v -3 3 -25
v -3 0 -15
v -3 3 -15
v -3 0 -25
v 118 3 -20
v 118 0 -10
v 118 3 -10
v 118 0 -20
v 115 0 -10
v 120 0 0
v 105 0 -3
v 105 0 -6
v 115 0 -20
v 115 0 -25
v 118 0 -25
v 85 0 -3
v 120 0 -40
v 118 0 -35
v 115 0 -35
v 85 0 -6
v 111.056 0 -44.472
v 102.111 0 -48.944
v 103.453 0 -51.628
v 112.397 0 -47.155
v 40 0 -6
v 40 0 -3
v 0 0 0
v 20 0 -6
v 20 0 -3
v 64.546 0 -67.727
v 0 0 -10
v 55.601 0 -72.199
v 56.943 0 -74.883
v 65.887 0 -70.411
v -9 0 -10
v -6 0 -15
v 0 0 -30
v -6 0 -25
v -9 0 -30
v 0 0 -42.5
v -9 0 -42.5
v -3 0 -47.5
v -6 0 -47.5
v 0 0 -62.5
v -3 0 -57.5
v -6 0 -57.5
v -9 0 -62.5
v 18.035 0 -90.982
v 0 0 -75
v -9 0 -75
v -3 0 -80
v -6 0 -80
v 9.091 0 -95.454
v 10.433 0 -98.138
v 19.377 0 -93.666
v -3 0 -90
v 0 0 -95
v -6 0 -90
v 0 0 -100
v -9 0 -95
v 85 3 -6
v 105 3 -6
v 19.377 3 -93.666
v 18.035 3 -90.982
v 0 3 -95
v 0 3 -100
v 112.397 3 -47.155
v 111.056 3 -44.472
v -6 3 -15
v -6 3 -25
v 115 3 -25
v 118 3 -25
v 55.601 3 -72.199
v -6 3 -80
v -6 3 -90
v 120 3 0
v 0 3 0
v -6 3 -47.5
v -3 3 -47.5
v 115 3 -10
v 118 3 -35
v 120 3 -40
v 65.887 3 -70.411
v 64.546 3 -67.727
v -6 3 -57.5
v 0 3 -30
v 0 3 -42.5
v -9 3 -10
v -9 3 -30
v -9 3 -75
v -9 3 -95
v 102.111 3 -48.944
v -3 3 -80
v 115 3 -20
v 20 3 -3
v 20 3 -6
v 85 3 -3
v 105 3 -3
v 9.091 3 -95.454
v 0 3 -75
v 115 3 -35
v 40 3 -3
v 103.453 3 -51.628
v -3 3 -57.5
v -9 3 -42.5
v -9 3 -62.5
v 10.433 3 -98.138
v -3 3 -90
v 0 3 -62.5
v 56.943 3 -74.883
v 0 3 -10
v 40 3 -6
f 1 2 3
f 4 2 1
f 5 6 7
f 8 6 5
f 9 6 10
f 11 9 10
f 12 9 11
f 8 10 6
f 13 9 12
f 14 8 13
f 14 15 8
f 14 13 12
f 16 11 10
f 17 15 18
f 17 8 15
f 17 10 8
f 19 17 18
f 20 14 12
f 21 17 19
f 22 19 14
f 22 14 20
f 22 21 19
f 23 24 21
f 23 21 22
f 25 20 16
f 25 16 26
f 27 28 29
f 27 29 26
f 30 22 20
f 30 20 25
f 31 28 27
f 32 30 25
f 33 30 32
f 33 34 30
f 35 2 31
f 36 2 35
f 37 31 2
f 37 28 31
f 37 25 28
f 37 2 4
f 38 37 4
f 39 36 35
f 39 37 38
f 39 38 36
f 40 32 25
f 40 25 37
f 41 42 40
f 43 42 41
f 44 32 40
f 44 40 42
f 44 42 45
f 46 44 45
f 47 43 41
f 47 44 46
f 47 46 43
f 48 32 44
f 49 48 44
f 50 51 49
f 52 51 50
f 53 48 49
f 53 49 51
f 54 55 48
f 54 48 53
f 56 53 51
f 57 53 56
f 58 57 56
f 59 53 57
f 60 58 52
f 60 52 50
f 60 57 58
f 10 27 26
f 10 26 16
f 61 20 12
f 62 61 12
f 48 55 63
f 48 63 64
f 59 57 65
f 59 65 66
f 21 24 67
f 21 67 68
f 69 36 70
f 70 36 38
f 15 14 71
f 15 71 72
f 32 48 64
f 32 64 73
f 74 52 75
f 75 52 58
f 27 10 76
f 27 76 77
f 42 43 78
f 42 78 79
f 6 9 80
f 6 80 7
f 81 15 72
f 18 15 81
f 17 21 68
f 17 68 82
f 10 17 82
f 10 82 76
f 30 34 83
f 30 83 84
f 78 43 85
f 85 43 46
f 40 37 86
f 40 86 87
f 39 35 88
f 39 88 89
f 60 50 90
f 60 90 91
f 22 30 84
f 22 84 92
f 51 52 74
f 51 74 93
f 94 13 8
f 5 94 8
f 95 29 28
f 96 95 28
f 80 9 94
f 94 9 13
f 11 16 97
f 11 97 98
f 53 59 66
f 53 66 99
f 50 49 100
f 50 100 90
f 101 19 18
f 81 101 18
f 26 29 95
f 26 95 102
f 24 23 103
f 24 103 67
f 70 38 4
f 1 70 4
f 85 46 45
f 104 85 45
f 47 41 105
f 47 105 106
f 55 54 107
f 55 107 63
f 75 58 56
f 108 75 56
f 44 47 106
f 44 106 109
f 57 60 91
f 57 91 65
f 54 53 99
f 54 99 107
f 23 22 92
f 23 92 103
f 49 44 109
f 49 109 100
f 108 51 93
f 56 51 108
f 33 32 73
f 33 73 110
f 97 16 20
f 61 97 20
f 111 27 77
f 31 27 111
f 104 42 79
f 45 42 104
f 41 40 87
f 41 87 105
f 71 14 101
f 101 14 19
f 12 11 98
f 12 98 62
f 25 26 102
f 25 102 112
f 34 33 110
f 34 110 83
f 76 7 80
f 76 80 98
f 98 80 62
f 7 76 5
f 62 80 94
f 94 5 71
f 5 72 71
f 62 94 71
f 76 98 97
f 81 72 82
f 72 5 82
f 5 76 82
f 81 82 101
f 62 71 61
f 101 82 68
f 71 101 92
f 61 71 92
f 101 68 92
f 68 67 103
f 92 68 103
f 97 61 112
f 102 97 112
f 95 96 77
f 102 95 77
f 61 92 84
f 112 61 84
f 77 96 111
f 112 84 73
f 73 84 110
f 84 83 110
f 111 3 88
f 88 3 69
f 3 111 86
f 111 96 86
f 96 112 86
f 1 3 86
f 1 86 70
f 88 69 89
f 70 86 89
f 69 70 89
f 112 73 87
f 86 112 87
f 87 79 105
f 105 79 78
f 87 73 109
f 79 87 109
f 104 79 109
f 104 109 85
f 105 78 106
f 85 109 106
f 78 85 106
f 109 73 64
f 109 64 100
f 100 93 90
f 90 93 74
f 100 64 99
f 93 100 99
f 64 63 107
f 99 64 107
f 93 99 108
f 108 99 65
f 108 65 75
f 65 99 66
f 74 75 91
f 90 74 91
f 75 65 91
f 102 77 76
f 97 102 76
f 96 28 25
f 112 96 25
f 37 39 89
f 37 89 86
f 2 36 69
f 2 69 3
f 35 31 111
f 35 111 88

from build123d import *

# Parameters (mm, degrees)
SKETCH1_W           = 3
SKETCH1_H           = 10
SKETCH1_W_2         = 20
SKETCH1_H_2         = 3
BOSS_EXTRUDE1_DEPTH = 3


with BuildPart() as part:
    # Sketch1 → Boss-Extrude1 (new body)
    with BuildSketch(Plane(origin=(0, 0, 0), x_dir=(1, 0, 0), z_dir=(0, 1, 0))):
        Polygon((0, 0), (0, 10), (-9, 10), (-9, 30), (0, 30), (0, 42.5), (-9, 42.5), (-9, 62.5), (0, 62.5), (0, 75), (-9, 75), (-9, 95), (0, 95), (0, 100), (9.091028316, 95.454485842), (10.432669103, 98.137767415), (19.376941013, 93.66563146), (18.035300226, 90.982349887), (55.601242248, 72.199378876), (56.942883035, 74.882660449), (65.887154945, 70.410524494), (64.545514158, 67.727242921), (102.11145618, 48.94427191), (103.453096967, 51.627553483), (112.397368877, 47.155417528), (111.05572809, 44.472135955), (120, 40), (120, 0), align=None)
        with Locations((116.5, 30)):
            Rectangle(SKETCH1_W, SKETCH1_H, mode=Mode.SUBTRACT)
        with Locations((116.5, 15)):
            Rectangle(SKETCH1_W, SKETCH1_H, mode=Mode.SUBTRACT)
        with Locations((30, 4.5)):
            Rectangle(SKETCH1_W_2, SKETCH1_H_2, mode=Mode.SUBTRACT)
        with Locations((95, 4.5)):
            Rectangle(SKETCH1_W_2, SKETCH1_H_2, mode=Mode.SUBTRACT)
        with Locations((-4.5, 85)):
            Rectangle(SKETCH1_W, SKETCH1_H, mode=Mode.SUBTRACT)
        with Locations((-4.5, 52.5)):
            Rectangle(SKETCH1_W, SKETCH1_H, mode=Mode.SUBTRACT)
        with Locations((-4.5, 20)):
            Rectangle(SKETCH1_W, SKETCH1_H, mode=Mode.SUBTRACT)
    extrude(amount=BOSS_EXTRUDE1_DEPTH)


solid = part.part
